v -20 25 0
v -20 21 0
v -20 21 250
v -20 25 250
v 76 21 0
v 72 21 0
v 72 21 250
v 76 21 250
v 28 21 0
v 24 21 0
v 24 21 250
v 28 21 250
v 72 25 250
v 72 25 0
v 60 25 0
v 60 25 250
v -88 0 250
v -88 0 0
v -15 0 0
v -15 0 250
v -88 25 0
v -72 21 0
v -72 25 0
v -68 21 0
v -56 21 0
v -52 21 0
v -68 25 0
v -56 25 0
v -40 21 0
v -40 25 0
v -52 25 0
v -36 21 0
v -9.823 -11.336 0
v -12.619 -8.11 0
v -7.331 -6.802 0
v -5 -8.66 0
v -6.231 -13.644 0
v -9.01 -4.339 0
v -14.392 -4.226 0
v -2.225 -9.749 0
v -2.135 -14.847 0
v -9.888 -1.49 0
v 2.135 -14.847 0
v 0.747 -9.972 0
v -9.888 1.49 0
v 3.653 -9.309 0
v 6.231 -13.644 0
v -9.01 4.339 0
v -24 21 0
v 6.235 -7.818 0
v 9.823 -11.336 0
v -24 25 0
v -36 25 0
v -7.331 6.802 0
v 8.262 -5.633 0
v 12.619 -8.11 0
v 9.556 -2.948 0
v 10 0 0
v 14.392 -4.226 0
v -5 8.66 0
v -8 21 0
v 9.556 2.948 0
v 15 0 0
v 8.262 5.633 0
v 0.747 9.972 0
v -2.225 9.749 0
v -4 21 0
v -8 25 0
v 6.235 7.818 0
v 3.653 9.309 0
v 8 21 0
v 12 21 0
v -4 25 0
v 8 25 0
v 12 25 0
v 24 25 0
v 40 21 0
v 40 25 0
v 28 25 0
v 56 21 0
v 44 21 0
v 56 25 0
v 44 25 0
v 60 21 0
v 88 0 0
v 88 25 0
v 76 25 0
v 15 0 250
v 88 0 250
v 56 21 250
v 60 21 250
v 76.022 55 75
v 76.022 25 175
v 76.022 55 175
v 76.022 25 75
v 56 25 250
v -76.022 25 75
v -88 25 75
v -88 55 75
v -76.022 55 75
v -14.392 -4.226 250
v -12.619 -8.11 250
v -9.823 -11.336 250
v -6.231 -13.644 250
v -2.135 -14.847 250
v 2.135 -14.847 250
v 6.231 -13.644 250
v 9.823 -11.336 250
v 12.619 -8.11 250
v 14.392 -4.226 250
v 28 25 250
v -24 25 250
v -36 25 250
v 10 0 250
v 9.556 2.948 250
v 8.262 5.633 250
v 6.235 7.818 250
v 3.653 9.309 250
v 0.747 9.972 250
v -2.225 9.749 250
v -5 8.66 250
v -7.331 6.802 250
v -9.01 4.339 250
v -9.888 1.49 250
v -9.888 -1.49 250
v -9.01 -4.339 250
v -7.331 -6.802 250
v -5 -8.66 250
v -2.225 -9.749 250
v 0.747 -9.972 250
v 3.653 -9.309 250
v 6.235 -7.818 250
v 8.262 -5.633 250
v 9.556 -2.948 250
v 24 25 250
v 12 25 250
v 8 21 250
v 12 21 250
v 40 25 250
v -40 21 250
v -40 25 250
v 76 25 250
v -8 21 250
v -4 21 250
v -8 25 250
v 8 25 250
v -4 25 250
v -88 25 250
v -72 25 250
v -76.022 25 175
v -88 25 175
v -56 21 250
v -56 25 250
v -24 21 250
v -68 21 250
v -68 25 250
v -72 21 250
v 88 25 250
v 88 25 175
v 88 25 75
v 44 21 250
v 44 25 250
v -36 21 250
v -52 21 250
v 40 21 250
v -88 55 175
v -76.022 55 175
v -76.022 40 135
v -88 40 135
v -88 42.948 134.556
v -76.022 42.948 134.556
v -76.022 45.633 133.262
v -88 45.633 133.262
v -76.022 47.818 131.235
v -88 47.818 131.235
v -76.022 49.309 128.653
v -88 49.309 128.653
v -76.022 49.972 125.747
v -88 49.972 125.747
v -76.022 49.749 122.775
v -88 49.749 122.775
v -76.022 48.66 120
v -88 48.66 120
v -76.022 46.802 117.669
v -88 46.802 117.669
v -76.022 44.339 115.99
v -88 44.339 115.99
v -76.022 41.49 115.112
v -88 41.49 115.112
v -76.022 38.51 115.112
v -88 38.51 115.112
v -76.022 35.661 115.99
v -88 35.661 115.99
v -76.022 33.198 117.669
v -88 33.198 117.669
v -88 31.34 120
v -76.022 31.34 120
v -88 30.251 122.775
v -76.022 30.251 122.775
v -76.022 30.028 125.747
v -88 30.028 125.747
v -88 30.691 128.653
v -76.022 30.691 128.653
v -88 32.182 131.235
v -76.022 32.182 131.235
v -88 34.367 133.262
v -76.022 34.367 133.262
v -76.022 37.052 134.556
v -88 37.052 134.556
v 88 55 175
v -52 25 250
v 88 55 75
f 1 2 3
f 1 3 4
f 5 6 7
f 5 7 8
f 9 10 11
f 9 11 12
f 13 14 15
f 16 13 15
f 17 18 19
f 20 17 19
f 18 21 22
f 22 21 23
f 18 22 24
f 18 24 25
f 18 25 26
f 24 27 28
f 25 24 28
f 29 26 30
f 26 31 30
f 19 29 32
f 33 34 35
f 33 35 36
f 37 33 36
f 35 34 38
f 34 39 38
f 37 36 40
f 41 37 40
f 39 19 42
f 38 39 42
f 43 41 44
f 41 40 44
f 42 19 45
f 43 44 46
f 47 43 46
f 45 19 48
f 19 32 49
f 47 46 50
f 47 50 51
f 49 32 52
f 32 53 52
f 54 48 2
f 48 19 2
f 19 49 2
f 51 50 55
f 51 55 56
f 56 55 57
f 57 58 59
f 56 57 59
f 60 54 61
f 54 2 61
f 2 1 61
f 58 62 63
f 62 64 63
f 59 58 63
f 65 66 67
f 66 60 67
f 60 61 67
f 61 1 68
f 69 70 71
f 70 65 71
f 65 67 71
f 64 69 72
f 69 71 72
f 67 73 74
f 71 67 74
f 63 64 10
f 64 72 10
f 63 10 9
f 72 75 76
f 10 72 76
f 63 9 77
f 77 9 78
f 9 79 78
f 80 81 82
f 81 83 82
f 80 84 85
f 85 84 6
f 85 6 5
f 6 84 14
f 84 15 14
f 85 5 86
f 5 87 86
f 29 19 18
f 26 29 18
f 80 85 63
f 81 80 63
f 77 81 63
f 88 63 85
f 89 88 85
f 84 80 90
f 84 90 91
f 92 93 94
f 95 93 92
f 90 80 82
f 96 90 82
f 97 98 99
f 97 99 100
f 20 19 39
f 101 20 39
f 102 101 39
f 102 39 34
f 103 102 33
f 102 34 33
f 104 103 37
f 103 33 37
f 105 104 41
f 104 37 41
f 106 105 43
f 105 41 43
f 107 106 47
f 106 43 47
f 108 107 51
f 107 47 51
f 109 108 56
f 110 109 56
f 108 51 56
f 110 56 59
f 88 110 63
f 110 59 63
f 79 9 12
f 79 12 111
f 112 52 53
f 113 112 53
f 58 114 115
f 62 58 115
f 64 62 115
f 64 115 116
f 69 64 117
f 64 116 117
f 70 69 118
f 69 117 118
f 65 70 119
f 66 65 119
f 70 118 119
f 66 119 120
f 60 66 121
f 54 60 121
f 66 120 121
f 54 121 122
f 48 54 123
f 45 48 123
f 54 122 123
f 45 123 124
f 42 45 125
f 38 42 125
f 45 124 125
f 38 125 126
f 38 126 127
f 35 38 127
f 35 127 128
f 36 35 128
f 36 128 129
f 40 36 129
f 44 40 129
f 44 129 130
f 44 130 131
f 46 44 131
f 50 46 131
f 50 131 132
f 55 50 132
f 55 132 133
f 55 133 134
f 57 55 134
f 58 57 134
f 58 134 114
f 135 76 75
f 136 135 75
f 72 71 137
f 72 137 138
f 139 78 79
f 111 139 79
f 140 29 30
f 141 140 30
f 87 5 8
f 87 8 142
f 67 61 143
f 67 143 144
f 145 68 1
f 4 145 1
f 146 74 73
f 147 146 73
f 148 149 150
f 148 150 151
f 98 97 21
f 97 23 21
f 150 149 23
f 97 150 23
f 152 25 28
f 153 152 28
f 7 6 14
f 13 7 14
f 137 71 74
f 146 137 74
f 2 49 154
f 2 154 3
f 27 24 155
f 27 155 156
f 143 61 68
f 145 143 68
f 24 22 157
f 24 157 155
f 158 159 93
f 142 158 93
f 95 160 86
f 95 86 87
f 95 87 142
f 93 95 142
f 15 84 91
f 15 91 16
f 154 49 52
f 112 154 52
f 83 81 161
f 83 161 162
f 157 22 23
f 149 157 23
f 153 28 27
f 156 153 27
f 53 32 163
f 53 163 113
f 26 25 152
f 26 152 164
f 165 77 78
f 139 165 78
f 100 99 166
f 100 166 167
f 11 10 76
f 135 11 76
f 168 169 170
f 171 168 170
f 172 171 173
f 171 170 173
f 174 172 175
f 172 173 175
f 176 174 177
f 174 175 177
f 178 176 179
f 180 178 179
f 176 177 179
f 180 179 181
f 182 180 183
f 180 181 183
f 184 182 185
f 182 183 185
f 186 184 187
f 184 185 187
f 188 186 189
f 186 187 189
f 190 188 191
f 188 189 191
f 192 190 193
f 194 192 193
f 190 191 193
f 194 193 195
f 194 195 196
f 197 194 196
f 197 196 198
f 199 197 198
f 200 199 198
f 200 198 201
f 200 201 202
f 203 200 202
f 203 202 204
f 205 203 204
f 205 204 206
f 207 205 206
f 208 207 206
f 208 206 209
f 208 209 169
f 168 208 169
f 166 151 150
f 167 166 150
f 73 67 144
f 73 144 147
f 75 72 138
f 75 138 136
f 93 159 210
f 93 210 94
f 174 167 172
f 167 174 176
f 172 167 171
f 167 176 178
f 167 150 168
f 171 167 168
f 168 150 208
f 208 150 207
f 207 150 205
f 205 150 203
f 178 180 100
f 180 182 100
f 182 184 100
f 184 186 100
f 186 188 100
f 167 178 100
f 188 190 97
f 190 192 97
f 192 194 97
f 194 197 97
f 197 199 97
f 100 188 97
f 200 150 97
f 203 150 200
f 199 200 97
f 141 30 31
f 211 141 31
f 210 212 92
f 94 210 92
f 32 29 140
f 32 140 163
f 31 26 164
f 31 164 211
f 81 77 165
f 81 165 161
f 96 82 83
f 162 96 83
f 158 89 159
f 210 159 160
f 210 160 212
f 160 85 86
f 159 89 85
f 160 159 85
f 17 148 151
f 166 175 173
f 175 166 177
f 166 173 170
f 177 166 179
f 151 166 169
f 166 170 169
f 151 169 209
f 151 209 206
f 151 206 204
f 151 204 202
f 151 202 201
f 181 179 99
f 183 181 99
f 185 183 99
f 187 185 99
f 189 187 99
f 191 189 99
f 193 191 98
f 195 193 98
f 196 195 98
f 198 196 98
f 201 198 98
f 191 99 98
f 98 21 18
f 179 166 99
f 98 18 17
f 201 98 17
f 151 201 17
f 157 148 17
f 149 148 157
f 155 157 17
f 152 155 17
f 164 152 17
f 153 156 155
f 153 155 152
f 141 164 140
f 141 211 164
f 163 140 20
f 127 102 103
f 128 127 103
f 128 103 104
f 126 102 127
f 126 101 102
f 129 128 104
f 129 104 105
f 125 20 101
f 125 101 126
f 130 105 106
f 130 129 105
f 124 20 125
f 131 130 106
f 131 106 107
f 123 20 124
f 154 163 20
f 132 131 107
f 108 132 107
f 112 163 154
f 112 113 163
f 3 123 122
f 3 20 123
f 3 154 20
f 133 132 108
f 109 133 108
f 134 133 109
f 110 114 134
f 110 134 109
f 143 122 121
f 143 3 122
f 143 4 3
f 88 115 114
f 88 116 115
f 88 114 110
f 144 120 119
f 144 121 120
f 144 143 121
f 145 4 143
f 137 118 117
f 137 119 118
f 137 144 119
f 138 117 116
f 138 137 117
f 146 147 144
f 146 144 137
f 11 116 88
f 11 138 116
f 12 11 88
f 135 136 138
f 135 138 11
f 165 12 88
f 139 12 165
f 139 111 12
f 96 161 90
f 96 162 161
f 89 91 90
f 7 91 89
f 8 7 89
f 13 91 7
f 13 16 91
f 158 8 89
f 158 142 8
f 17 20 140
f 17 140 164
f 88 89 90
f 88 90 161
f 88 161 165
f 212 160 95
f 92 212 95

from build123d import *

# Parameters (mm, degrees)
BOSS_EXTRUDE1_DEPTH = 250
SKETCH3_R           = 10
CUT_EXTRUDE1_DEPTH  = 251
SKETCH4_W           = 4
SKETCH4_H           = 4
CUT_EXTRUDE2_DEPTH  = 251
LPATTERN1_COUNT     = 10
LPATTERN1_PITCH     = 16
SKETCH5_W           = 11.978375281
SKETCH5_H           = 100
BOSS_EXTRUDE2_DEPTH = 30
SKETCH6_R           = 10
CUT_EXTRUDE3_DEPTH  = 20


with BuildPart() as part:
    # Sketch1 → Boss-Extrude1 (new body)
    with BuildSketch(Plane.XY):
        with BuildLine():
            Line((15, 0), (88, 0))
            Line((88, 0), (88, 25))
            Line((88, 25), (-88, 25))
            Line((-88, 25), (-88, 0))
            Line((-88, 0), (-15, 0))
            ThreePointArc((-15, 0), (0, -15), (15, 0))
        make_face()
    extrude(amount=BOSS_EXTRUDE1_DEPTH)

    # Sketch3 → Cut-Extrude1 (cut, through all)
    with BuildSketch(Plane.XY.offset(250)):
        Circle(SKETCH3_R)
    extrude(amount=-CUT_EXTRUDE1_DEPTH, mode=Mode.SUBTRACT)

    # Sketch4 → Cut-Extrude2 (cut, through all)
    with BuildSketch(Plane.XY.offset(250)):
        with Locations((-70, 23)):
            Rectangle(SKETCH4_W, SKETCH4_H)
    cut_extrude2 = extrude(amount=-CUT_EXTRUDE2_DEPTH, mode=Mode.SUBTRACT)

    # LPattern1: Cut-Extrude2 ×10
    with Locations(*[(i * LPATTERN1_PITCH, 0, 0) for i in range(1, LPATTERN1_COUNT)]):
        add(cut_extrude2, mode=Mode.SUBTRACT)

    # Sketch5 → Boss-Extrude2 (add)
    with BuildSketch(Plane(origin=(0, 25, 0), x_dir=(1, 0, 0), z_dir=(0, 1, 0))):
        with Locations((-82.010812359, -125)):
            Rectangle(SKETCH5_W, SKETCH5_H)
    boss_extrude2 = extrude(amount=BOSS_EXTRUDE2_DEPTH)

    # Mirror1: Boss-Extrude2 across plane
    add(boss_extrude2.mirror(Plane.ZY))

    # Sketch6 → Cut-Extrude3 (cut)
    with BuildSketch(Plane.ZY.offset(88)):
        with Locations((125, 40)):
            Circle(SKETCH6_R)
    extrude(amount=-CUT_EXTRUDE3_DEPTH, mode=Mode.SUBTRACT)


solid = part.part
